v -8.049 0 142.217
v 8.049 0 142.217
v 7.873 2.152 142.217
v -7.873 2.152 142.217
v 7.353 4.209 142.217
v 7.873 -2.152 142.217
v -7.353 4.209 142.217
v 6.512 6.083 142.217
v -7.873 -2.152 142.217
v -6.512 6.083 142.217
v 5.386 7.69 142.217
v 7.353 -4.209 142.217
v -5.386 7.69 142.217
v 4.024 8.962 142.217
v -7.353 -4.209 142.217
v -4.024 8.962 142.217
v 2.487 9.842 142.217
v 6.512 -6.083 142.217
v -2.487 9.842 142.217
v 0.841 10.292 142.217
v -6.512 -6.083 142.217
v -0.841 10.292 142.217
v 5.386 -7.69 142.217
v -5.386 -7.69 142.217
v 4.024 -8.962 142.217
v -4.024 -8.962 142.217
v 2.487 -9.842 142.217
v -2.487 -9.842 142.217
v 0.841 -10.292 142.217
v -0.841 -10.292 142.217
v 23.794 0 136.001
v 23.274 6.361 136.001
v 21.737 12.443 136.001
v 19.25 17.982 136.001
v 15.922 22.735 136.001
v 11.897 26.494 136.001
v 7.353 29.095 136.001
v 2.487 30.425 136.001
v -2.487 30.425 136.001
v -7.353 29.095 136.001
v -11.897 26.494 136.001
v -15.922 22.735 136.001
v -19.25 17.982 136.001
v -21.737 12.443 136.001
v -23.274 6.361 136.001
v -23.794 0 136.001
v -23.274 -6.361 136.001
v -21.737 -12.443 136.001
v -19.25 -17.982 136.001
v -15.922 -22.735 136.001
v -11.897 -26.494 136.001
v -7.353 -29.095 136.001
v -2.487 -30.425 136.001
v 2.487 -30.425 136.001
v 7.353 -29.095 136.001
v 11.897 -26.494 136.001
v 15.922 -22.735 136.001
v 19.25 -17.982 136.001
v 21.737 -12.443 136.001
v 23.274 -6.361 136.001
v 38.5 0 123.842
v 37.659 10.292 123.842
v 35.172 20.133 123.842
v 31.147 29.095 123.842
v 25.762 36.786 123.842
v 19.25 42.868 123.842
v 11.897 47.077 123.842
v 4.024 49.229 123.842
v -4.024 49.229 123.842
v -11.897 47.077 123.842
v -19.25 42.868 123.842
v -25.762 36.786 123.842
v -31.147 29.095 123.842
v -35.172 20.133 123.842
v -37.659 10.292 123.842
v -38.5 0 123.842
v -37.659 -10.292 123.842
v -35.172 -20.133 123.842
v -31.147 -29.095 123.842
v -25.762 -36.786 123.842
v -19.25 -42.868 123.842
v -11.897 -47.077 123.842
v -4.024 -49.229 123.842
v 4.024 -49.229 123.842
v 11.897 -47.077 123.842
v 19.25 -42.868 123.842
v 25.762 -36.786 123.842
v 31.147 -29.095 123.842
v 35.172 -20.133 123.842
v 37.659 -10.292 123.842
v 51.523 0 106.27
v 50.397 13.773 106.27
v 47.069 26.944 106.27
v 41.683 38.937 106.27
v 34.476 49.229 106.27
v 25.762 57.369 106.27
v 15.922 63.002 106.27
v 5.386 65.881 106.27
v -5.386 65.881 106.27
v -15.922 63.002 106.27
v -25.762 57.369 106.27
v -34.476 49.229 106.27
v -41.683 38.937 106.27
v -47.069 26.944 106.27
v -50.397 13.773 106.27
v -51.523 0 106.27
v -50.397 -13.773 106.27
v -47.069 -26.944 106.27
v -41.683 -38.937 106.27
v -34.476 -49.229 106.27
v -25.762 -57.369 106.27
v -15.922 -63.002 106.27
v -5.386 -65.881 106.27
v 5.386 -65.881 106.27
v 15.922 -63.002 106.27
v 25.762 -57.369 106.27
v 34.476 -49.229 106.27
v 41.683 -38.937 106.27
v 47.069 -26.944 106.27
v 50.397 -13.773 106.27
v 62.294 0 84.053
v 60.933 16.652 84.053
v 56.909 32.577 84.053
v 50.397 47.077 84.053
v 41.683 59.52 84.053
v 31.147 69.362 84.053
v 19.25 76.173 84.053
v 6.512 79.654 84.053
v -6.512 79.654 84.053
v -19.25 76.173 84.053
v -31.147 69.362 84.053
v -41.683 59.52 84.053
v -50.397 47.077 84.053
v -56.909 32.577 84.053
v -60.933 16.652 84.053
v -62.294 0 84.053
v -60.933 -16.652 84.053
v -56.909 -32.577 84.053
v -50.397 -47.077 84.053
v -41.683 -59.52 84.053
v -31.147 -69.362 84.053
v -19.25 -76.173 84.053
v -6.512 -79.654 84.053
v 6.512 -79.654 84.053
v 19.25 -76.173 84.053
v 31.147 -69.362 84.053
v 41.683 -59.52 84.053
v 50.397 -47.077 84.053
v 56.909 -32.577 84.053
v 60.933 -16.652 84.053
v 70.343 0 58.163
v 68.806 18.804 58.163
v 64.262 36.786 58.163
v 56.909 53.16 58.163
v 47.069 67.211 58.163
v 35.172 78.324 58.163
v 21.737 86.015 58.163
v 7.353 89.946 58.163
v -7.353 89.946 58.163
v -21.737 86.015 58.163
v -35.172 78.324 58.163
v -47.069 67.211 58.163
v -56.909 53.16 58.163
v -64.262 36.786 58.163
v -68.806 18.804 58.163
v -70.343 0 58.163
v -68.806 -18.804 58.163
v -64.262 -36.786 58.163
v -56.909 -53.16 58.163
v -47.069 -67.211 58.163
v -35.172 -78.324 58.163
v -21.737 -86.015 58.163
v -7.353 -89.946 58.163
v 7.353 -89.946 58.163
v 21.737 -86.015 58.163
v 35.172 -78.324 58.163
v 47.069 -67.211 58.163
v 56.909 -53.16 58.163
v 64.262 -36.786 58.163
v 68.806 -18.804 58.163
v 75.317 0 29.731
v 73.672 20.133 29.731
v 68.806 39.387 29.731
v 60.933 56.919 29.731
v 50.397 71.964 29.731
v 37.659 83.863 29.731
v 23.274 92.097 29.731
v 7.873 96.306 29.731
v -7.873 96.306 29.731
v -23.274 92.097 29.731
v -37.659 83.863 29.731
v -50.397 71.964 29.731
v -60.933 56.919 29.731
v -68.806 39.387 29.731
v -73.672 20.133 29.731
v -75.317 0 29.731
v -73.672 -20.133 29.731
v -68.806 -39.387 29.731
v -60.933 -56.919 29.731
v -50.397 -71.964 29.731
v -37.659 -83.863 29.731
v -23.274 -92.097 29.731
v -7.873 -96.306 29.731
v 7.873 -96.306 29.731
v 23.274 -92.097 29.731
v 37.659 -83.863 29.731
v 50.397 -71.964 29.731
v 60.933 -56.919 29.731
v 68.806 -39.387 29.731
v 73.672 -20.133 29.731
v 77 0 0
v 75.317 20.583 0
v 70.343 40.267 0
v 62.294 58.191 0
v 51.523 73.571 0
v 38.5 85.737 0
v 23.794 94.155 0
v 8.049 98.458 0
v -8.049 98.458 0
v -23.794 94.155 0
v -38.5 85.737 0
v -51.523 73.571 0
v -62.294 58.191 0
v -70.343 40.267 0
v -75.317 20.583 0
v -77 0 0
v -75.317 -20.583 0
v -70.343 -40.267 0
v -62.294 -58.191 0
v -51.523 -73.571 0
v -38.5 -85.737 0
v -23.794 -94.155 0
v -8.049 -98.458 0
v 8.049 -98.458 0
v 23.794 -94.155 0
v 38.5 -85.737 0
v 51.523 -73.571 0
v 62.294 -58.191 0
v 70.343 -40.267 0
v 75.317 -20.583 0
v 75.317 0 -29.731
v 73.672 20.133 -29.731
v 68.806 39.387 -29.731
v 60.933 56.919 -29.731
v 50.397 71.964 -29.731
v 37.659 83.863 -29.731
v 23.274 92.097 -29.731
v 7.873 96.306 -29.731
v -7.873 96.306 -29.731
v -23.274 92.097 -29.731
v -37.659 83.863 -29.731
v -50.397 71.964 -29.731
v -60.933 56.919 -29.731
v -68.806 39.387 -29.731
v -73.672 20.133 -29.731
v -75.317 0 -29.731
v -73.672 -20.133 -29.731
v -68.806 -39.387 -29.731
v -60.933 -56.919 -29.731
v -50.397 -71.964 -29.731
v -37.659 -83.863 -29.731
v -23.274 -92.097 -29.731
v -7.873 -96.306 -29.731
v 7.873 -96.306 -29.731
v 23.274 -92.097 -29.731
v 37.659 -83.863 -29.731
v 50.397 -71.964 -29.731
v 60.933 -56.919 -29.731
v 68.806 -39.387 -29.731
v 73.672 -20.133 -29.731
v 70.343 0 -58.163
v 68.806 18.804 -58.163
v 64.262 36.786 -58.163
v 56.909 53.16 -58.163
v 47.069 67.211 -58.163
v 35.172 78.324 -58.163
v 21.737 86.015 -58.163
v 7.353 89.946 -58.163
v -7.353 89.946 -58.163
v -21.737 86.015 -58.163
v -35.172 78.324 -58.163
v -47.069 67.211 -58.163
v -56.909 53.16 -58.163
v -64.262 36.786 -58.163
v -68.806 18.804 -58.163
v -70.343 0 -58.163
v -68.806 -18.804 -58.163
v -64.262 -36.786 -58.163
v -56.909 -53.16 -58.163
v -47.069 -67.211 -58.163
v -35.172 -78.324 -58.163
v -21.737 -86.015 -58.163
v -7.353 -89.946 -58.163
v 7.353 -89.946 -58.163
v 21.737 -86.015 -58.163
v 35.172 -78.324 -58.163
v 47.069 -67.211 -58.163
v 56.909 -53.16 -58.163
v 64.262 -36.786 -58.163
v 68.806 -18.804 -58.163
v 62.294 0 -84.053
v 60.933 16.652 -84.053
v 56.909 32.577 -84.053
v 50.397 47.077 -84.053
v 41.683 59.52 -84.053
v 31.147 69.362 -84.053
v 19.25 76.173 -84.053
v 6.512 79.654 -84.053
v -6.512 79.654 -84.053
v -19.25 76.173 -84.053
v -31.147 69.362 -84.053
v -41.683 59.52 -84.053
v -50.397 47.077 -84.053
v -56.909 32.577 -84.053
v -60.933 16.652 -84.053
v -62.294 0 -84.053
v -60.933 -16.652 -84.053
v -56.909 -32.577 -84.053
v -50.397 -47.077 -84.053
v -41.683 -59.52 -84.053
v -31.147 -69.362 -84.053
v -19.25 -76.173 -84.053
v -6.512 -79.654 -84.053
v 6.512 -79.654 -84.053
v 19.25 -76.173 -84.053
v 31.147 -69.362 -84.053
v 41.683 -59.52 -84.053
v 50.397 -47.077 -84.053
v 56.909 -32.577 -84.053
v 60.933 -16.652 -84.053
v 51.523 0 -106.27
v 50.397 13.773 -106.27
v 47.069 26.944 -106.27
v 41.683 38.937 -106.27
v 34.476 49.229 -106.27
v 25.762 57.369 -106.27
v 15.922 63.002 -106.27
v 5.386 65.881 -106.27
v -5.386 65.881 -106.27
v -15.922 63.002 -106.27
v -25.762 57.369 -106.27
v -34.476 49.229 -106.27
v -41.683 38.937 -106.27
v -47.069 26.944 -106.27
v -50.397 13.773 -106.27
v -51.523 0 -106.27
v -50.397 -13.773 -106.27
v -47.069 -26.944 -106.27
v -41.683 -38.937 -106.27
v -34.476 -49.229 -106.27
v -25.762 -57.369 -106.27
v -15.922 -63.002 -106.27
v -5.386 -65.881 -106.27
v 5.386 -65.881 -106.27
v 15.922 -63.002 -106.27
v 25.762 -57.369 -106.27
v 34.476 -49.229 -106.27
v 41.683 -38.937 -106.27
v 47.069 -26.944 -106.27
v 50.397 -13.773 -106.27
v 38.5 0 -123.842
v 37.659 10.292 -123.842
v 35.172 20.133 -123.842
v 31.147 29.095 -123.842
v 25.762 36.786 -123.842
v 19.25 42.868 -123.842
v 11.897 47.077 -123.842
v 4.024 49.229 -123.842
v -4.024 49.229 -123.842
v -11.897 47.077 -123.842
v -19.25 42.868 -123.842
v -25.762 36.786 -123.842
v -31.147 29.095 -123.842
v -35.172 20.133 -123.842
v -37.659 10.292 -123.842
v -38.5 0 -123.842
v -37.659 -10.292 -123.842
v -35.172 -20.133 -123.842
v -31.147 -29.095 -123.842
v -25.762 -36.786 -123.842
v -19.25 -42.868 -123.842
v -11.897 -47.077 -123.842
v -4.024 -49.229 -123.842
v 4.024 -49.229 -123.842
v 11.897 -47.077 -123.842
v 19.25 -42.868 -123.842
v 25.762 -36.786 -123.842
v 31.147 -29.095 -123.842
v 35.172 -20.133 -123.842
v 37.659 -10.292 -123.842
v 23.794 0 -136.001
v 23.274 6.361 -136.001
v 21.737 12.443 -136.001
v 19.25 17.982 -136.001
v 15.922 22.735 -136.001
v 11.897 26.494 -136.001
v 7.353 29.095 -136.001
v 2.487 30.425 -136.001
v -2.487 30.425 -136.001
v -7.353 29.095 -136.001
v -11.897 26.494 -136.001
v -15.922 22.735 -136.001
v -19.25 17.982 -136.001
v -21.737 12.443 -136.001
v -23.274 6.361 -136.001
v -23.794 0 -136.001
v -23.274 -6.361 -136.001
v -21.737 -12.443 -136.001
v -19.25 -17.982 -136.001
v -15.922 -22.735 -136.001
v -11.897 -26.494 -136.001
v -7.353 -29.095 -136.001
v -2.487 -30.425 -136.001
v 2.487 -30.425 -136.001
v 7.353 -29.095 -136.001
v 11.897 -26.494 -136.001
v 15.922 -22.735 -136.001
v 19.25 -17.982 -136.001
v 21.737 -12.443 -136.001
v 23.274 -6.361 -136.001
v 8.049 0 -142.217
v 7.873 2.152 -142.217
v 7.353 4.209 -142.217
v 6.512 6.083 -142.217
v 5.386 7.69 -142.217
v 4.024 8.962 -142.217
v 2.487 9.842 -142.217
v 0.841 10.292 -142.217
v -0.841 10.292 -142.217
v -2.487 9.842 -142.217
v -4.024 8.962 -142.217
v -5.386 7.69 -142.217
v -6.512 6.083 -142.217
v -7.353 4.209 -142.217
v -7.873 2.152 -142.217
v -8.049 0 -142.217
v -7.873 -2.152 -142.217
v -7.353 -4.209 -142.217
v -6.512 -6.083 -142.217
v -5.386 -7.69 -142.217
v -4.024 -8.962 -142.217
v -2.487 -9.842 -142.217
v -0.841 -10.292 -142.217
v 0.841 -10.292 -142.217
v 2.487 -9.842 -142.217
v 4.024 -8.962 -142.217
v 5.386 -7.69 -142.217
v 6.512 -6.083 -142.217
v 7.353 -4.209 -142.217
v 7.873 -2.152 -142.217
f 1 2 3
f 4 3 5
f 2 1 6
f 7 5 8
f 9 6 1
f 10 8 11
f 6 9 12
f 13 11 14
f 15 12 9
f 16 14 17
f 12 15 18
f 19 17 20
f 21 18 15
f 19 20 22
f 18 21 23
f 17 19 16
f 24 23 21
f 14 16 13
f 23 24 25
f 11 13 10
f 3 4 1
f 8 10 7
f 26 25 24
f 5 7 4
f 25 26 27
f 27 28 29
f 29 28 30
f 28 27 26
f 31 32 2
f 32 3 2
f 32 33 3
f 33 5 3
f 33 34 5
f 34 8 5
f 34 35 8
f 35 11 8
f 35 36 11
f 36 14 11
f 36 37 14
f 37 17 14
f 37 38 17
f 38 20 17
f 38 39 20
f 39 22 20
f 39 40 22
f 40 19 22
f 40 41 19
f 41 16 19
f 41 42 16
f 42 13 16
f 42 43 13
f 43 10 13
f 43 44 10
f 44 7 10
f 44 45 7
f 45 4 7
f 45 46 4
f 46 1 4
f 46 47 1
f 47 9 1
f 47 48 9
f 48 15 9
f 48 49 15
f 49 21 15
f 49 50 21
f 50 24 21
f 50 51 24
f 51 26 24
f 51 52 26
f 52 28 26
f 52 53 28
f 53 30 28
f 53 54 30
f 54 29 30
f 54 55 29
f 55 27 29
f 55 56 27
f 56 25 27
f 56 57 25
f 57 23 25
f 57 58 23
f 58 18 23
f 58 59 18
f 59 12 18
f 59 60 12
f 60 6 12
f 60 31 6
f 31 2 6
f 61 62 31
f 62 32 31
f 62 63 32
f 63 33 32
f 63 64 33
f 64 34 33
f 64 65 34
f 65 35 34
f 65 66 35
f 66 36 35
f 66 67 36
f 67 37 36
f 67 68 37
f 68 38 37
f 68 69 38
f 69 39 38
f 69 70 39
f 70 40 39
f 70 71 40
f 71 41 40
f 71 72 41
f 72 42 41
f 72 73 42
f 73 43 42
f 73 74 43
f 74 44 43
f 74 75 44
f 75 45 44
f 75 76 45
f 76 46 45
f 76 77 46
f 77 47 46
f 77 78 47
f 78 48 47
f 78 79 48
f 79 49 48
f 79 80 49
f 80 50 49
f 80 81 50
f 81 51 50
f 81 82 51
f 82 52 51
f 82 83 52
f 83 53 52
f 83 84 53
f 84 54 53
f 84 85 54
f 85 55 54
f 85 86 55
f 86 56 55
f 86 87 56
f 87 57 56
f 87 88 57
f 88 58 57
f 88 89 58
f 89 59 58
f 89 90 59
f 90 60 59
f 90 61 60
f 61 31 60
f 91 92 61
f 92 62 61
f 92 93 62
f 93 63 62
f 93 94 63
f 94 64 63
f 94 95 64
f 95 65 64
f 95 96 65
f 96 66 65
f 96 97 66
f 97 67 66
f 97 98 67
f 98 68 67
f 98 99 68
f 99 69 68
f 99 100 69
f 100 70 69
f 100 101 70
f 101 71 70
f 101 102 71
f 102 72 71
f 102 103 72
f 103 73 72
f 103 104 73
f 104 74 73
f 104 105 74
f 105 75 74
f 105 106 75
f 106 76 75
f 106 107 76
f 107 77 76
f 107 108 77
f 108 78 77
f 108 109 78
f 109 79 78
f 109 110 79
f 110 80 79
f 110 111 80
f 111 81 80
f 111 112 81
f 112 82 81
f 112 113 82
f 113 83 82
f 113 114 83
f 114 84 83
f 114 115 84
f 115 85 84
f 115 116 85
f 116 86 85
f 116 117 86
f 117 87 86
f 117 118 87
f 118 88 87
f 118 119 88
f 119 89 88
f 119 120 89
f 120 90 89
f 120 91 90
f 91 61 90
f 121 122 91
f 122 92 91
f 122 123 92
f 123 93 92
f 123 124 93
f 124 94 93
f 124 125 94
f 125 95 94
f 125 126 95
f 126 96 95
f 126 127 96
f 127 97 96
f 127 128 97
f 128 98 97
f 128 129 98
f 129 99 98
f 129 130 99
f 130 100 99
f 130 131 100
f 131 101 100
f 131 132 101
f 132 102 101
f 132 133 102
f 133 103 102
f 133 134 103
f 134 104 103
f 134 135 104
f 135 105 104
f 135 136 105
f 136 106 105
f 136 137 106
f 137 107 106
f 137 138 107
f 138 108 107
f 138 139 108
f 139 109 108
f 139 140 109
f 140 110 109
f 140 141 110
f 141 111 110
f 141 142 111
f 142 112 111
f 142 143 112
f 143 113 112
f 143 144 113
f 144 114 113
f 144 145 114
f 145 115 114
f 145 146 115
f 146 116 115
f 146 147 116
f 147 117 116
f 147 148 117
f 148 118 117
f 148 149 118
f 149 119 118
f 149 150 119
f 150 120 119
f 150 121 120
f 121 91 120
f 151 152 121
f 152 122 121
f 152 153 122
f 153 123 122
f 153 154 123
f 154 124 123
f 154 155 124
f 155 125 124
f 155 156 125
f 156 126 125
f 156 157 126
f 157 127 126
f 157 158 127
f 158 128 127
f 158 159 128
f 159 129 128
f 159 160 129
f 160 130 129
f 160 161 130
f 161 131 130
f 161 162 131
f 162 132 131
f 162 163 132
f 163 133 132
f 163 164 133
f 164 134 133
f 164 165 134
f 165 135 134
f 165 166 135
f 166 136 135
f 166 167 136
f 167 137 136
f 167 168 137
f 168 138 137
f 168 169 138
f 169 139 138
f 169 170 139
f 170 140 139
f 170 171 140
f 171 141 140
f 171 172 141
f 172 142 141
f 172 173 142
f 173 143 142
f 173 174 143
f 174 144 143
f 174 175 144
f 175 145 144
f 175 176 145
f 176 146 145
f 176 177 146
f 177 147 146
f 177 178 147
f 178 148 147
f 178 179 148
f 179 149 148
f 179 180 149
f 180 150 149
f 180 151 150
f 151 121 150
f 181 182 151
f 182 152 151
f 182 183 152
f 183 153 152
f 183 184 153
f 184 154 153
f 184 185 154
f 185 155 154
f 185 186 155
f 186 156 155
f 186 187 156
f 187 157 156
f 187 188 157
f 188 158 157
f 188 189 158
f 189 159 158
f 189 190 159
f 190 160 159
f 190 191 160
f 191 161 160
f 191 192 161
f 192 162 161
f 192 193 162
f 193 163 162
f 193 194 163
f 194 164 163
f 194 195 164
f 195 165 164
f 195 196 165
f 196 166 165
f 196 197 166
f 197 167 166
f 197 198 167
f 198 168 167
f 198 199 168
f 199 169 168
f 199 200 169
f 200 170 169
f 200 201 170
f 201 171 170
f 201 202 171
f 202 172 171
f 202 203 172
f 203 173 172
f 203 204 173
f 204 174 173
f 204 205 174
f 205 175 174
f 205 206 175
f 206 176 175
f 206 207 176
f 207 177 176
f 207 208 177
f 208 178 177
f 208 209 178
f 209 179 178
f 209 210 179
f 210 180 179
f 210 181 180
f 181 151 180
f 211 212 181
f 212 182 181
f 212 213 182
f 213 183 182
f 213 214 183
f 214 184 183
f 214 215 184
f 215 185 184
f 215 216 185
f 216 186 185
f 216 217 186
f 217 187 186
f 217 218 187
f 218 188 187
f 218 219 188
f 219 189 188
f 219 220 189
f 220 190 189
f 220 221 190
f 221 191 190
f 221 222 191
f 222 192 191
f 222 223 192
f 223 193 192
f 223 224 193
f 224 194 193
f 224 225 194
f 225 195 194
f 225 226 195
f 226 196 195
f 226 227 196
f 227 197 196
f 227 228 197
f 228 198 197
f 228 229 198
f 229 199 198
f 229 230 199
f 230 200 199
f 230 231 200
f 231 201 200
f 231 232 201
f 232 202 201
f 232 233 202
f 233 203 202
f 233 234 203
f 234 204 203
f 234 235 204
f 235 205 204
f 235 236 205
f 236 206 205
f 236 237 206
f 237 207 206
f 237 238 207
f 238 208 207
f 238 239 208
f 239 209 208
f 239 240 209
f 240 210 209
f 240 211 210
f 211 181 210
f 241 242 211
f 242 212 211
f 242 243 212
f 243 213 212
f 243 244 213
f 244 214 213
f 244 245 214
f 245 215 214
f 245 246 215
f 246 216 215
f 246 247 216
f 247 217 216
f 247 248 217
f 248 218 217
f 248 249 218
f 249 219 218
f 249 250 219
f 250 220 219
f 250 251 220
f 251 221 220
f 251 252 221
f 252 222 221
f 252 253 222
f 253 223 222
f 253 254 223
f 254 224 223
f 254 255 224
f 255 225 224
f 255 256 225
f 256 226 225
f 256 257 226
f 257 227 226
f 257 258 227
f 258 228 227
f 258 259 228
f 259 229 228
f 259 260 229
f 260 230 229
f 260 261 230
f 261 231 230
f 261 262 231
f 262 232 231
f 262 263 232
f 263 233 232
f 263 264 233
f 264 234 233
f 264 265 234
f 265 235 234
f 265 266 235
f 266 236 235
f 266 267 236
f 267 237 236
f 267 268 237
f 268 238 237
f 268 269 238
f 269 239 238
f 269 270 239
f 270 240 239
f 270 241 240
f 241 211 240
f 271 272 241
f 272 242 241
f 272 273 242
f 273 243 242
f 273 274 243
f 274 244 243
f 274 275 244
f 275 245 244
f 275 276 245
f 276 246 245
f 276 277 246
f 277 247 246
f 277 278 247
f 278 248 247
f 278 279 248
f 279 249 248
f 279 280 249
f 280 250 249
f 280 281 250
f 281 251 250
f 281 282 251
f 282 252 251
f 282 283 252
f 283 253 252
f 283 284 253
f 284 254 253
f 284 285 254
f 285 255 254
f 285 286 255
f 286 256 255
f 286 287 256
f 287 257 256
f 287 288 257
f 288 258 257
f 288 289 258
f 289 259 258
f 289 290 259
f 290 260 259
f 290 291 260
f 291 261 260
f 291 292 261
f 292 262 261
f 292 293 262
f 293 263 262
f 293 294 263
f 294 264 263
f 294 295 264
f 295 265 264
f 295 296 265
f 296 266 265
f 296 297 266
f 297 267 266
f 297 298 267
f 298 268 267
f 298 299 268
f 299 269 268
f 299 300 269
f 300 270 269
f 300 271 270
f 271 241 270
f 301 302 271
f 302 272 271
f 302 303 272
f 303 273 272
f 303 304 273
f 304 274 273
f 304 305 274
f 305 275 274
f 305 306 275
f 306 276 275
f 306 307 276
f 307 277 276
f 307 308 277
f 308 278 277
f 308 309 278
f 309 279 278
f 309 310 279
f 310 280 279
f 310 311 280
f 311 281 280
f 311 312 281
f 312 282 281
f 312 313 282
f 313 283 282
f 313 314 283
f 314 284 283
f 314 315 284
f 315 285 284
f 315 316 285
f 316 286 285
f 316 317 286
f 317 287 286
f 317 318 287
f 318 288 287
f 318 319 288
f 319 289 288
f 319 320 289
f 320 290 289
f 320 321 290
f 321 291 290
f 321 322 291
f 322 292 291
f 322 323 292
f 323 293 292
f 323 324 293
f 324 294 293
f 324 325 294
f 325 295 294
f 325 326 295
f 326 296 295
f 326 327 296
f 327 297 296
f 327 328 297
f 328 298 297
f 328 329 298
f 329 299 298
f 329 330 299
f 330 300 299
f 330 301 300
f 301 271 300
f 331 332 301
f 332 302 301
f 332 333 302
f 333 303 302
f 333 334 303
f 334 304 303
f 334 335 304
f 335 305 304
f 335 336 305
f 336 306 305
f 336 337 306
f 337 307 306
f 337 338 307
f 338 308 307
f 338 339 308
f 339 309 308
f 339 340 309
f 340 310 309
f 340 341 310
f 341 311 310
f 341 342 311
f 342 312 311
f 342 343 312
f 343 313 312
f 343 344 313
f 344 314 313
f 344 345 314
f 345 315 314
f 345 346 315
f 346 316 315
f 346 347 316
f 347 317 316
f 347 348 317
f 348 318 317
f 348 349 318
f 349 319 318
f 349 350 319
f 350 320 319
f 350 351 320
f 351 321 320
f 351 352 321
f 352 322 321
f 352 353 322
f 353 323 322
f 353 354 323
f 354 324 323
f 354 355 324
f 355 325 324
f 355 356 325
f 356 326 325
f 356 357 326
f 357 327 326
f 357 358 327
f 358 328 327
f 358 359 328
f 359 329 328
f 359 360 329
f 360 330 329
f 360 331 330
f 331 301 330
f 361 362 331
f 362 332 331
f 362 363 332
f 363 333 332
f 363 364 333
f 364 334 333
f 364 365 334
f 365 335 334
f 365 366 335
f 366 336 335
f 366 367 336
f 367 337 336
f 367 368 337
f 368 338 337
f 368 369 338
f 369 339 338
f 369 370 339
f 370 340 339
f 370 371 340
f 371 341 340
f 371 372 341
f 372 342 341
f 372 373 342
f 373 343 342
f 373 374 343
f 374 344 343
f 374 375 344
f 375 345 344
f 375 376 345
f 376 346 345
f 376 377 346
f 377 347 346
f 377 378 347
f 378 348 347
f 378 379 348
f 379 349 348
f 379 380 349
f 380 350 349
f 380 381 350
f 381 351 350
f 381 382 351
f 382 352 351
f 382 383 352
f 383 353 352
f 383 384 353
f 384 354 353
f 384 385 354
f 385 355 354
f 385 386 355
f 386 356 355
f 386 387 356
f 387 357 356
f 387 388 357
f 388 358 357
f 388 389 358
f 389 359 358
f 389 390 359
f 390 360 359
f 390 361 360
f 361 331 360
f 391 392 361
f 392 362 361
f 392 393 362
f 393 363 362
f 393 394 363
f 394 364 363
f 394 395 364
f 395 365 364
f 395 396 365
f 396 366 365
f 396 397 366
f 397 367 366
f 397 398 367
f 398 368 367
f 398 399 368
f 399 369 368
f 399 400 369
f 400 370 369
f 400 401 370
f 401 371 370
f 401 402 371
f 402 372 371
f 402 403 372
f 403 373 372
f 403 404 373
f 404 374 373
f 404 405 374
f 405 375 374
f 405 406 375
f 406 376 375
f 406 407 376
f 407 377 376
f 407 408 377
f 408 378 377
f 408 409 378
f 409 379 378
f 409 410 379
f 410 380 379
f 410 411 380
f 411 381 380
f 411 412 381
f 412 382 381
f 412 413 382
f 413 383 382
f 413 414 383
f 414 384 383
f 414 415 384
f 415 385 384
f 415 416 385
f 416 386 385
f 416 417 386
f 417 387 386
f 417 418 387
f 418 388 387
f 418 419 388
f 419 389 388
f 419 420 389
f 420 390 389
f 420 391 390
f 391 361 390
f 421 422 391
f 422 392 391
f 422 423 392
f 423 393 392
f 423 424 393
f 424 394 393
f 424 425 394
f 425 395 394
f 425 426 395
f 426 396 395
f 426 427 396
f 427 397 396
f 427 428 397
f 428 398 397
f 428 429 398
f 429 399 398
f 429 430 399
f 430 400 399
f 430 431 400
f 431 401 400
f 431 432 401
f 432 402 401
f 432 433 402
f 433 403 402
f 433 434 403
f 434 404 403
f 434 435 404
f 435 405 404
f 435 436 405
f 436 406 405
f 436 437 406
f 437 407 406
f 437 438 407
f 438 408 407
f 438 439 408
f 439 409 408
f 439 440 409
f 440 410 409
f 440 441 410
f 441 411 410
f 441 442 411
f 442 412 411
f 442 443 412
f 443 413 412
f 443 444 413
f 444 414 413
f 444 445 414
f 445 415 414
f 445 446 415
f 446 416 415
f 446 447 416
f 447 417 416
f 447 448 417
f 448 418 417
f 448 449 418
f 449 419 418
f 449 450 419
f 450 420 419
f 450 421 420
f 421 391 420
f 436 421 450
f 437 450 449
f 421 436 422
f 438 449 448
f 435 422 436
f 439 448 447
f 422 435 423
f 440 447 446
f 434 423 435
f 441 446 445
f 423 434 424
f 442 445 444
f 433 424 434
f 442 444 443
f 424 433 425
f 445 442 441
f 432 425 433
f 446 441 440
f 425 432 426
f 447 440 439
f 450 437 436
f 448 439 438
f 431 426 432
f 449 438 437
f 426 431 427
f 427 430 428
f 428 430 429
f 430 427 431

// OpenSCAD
// Generated by SolidPython 1.0.1 on 2020-07-29 00:46:47


scale(v = [7, 9, 13]) {
	sphere(r = 11);
}
/***********************************************
*********      SolidPython code:      **********
************************************************
 
# import packages: SolidPython
from solid import *
from solid.utils import *
from itertools import chain, combinations, permutations


class Resize:

    def __init__(self, scad_file):
        self.scad_file = scad_file
        #self.scad_file = import_scad(scad_file)
        # cone/cylinder param:
        self.r1 = 0
        self.r2 = 0
        self.h = 0
        # rectangular prism param:
        self.w = 0
        self.l = 0
        # ellipse param:
        self.r = 0

    # import OpenScad code (file name corresponds to shape)


    # classify shape + parameters
    def assign(self, param1, param2, param3):
        if self.scad_file == 'cone.scad':
            self.r1 = param1
            self.r2 = param2
            self.h = param3
        elif self.scad_file == 'cylinder.scad':
            self.r1 = param1
            self.r2 = param2
            self.h = param3
        elif self.scad_file == 'rectangularPrism.scad':
            self.h = param1
            self.l = param2
            self.w = param3
        else:
            self.r = param1
            self.h = param2

    # resize parameters
    def iterate(self):
        x = range(3, 20, 2)
        i = 1
        if self.scad_file == 'cone.scad':
            tempList = list(permutations(x, 2))
            for temp in tempList:
                param1 = temp[0]
                param2 = temp[1]
                filepath = 'produced_scad_files/' + 'cone' + str(param1) + '_' + str(param2) + '_' + '.scad'
                scad_render_to_file(cylinder(h=param1, r1=param2, r2=0), filepath)

        elif self.scad_file == 'cylinder.scad':
            tempList = list(permutations(x, 3))
            for temp in tempList:
                param1 = temp[0]
                param2 = temp[1]
                filepath = 'produced_scad_files/' + 'cylinder' + str(param1) + '_' + str(param2) + '_' + '.scad'
                scad_render_to_file(cylinder(h=param1, r1=param2, r2=param2), filepath)

        elif self.scad_file == 'rectangularPrism.scad':
            tempList = list(permutations(x, 3))
            for temp in tempList:
                param1 = temp[0]
                param2 = temp[1]
                param3 = temp[2]
                filepath = 'produced_scad_files/' + 'rectangularPrism' + str(param1) + '_' + str(param2) + '_' + str(
                    param3) + '.scad'
                scad_render_to_file(cube(size=(param1, param2, param3)), filepath)

        elif self.scad_file == 'ellipse.scad':
            tempList = list(permutations(x, 4))
            for temp in tempList:
                param1 = temp[0]
                param2 = temp[1]
                param3 = temp[2]
                param4 = temp[3]
                filepath = 'produced_scad_files/' + 'ellipse' + str(param1) + '_' + str(param2) + '_' + str(param3) + '_' + str(param4) + '.scad'
                scad_render_to_file(scale([param1, param2, param3])(sphere(r=param4)), filepath)

    def render_to_scadfile(self):
        scad_render_to_file(scad, 'example.scad') 
 
************************************************/
